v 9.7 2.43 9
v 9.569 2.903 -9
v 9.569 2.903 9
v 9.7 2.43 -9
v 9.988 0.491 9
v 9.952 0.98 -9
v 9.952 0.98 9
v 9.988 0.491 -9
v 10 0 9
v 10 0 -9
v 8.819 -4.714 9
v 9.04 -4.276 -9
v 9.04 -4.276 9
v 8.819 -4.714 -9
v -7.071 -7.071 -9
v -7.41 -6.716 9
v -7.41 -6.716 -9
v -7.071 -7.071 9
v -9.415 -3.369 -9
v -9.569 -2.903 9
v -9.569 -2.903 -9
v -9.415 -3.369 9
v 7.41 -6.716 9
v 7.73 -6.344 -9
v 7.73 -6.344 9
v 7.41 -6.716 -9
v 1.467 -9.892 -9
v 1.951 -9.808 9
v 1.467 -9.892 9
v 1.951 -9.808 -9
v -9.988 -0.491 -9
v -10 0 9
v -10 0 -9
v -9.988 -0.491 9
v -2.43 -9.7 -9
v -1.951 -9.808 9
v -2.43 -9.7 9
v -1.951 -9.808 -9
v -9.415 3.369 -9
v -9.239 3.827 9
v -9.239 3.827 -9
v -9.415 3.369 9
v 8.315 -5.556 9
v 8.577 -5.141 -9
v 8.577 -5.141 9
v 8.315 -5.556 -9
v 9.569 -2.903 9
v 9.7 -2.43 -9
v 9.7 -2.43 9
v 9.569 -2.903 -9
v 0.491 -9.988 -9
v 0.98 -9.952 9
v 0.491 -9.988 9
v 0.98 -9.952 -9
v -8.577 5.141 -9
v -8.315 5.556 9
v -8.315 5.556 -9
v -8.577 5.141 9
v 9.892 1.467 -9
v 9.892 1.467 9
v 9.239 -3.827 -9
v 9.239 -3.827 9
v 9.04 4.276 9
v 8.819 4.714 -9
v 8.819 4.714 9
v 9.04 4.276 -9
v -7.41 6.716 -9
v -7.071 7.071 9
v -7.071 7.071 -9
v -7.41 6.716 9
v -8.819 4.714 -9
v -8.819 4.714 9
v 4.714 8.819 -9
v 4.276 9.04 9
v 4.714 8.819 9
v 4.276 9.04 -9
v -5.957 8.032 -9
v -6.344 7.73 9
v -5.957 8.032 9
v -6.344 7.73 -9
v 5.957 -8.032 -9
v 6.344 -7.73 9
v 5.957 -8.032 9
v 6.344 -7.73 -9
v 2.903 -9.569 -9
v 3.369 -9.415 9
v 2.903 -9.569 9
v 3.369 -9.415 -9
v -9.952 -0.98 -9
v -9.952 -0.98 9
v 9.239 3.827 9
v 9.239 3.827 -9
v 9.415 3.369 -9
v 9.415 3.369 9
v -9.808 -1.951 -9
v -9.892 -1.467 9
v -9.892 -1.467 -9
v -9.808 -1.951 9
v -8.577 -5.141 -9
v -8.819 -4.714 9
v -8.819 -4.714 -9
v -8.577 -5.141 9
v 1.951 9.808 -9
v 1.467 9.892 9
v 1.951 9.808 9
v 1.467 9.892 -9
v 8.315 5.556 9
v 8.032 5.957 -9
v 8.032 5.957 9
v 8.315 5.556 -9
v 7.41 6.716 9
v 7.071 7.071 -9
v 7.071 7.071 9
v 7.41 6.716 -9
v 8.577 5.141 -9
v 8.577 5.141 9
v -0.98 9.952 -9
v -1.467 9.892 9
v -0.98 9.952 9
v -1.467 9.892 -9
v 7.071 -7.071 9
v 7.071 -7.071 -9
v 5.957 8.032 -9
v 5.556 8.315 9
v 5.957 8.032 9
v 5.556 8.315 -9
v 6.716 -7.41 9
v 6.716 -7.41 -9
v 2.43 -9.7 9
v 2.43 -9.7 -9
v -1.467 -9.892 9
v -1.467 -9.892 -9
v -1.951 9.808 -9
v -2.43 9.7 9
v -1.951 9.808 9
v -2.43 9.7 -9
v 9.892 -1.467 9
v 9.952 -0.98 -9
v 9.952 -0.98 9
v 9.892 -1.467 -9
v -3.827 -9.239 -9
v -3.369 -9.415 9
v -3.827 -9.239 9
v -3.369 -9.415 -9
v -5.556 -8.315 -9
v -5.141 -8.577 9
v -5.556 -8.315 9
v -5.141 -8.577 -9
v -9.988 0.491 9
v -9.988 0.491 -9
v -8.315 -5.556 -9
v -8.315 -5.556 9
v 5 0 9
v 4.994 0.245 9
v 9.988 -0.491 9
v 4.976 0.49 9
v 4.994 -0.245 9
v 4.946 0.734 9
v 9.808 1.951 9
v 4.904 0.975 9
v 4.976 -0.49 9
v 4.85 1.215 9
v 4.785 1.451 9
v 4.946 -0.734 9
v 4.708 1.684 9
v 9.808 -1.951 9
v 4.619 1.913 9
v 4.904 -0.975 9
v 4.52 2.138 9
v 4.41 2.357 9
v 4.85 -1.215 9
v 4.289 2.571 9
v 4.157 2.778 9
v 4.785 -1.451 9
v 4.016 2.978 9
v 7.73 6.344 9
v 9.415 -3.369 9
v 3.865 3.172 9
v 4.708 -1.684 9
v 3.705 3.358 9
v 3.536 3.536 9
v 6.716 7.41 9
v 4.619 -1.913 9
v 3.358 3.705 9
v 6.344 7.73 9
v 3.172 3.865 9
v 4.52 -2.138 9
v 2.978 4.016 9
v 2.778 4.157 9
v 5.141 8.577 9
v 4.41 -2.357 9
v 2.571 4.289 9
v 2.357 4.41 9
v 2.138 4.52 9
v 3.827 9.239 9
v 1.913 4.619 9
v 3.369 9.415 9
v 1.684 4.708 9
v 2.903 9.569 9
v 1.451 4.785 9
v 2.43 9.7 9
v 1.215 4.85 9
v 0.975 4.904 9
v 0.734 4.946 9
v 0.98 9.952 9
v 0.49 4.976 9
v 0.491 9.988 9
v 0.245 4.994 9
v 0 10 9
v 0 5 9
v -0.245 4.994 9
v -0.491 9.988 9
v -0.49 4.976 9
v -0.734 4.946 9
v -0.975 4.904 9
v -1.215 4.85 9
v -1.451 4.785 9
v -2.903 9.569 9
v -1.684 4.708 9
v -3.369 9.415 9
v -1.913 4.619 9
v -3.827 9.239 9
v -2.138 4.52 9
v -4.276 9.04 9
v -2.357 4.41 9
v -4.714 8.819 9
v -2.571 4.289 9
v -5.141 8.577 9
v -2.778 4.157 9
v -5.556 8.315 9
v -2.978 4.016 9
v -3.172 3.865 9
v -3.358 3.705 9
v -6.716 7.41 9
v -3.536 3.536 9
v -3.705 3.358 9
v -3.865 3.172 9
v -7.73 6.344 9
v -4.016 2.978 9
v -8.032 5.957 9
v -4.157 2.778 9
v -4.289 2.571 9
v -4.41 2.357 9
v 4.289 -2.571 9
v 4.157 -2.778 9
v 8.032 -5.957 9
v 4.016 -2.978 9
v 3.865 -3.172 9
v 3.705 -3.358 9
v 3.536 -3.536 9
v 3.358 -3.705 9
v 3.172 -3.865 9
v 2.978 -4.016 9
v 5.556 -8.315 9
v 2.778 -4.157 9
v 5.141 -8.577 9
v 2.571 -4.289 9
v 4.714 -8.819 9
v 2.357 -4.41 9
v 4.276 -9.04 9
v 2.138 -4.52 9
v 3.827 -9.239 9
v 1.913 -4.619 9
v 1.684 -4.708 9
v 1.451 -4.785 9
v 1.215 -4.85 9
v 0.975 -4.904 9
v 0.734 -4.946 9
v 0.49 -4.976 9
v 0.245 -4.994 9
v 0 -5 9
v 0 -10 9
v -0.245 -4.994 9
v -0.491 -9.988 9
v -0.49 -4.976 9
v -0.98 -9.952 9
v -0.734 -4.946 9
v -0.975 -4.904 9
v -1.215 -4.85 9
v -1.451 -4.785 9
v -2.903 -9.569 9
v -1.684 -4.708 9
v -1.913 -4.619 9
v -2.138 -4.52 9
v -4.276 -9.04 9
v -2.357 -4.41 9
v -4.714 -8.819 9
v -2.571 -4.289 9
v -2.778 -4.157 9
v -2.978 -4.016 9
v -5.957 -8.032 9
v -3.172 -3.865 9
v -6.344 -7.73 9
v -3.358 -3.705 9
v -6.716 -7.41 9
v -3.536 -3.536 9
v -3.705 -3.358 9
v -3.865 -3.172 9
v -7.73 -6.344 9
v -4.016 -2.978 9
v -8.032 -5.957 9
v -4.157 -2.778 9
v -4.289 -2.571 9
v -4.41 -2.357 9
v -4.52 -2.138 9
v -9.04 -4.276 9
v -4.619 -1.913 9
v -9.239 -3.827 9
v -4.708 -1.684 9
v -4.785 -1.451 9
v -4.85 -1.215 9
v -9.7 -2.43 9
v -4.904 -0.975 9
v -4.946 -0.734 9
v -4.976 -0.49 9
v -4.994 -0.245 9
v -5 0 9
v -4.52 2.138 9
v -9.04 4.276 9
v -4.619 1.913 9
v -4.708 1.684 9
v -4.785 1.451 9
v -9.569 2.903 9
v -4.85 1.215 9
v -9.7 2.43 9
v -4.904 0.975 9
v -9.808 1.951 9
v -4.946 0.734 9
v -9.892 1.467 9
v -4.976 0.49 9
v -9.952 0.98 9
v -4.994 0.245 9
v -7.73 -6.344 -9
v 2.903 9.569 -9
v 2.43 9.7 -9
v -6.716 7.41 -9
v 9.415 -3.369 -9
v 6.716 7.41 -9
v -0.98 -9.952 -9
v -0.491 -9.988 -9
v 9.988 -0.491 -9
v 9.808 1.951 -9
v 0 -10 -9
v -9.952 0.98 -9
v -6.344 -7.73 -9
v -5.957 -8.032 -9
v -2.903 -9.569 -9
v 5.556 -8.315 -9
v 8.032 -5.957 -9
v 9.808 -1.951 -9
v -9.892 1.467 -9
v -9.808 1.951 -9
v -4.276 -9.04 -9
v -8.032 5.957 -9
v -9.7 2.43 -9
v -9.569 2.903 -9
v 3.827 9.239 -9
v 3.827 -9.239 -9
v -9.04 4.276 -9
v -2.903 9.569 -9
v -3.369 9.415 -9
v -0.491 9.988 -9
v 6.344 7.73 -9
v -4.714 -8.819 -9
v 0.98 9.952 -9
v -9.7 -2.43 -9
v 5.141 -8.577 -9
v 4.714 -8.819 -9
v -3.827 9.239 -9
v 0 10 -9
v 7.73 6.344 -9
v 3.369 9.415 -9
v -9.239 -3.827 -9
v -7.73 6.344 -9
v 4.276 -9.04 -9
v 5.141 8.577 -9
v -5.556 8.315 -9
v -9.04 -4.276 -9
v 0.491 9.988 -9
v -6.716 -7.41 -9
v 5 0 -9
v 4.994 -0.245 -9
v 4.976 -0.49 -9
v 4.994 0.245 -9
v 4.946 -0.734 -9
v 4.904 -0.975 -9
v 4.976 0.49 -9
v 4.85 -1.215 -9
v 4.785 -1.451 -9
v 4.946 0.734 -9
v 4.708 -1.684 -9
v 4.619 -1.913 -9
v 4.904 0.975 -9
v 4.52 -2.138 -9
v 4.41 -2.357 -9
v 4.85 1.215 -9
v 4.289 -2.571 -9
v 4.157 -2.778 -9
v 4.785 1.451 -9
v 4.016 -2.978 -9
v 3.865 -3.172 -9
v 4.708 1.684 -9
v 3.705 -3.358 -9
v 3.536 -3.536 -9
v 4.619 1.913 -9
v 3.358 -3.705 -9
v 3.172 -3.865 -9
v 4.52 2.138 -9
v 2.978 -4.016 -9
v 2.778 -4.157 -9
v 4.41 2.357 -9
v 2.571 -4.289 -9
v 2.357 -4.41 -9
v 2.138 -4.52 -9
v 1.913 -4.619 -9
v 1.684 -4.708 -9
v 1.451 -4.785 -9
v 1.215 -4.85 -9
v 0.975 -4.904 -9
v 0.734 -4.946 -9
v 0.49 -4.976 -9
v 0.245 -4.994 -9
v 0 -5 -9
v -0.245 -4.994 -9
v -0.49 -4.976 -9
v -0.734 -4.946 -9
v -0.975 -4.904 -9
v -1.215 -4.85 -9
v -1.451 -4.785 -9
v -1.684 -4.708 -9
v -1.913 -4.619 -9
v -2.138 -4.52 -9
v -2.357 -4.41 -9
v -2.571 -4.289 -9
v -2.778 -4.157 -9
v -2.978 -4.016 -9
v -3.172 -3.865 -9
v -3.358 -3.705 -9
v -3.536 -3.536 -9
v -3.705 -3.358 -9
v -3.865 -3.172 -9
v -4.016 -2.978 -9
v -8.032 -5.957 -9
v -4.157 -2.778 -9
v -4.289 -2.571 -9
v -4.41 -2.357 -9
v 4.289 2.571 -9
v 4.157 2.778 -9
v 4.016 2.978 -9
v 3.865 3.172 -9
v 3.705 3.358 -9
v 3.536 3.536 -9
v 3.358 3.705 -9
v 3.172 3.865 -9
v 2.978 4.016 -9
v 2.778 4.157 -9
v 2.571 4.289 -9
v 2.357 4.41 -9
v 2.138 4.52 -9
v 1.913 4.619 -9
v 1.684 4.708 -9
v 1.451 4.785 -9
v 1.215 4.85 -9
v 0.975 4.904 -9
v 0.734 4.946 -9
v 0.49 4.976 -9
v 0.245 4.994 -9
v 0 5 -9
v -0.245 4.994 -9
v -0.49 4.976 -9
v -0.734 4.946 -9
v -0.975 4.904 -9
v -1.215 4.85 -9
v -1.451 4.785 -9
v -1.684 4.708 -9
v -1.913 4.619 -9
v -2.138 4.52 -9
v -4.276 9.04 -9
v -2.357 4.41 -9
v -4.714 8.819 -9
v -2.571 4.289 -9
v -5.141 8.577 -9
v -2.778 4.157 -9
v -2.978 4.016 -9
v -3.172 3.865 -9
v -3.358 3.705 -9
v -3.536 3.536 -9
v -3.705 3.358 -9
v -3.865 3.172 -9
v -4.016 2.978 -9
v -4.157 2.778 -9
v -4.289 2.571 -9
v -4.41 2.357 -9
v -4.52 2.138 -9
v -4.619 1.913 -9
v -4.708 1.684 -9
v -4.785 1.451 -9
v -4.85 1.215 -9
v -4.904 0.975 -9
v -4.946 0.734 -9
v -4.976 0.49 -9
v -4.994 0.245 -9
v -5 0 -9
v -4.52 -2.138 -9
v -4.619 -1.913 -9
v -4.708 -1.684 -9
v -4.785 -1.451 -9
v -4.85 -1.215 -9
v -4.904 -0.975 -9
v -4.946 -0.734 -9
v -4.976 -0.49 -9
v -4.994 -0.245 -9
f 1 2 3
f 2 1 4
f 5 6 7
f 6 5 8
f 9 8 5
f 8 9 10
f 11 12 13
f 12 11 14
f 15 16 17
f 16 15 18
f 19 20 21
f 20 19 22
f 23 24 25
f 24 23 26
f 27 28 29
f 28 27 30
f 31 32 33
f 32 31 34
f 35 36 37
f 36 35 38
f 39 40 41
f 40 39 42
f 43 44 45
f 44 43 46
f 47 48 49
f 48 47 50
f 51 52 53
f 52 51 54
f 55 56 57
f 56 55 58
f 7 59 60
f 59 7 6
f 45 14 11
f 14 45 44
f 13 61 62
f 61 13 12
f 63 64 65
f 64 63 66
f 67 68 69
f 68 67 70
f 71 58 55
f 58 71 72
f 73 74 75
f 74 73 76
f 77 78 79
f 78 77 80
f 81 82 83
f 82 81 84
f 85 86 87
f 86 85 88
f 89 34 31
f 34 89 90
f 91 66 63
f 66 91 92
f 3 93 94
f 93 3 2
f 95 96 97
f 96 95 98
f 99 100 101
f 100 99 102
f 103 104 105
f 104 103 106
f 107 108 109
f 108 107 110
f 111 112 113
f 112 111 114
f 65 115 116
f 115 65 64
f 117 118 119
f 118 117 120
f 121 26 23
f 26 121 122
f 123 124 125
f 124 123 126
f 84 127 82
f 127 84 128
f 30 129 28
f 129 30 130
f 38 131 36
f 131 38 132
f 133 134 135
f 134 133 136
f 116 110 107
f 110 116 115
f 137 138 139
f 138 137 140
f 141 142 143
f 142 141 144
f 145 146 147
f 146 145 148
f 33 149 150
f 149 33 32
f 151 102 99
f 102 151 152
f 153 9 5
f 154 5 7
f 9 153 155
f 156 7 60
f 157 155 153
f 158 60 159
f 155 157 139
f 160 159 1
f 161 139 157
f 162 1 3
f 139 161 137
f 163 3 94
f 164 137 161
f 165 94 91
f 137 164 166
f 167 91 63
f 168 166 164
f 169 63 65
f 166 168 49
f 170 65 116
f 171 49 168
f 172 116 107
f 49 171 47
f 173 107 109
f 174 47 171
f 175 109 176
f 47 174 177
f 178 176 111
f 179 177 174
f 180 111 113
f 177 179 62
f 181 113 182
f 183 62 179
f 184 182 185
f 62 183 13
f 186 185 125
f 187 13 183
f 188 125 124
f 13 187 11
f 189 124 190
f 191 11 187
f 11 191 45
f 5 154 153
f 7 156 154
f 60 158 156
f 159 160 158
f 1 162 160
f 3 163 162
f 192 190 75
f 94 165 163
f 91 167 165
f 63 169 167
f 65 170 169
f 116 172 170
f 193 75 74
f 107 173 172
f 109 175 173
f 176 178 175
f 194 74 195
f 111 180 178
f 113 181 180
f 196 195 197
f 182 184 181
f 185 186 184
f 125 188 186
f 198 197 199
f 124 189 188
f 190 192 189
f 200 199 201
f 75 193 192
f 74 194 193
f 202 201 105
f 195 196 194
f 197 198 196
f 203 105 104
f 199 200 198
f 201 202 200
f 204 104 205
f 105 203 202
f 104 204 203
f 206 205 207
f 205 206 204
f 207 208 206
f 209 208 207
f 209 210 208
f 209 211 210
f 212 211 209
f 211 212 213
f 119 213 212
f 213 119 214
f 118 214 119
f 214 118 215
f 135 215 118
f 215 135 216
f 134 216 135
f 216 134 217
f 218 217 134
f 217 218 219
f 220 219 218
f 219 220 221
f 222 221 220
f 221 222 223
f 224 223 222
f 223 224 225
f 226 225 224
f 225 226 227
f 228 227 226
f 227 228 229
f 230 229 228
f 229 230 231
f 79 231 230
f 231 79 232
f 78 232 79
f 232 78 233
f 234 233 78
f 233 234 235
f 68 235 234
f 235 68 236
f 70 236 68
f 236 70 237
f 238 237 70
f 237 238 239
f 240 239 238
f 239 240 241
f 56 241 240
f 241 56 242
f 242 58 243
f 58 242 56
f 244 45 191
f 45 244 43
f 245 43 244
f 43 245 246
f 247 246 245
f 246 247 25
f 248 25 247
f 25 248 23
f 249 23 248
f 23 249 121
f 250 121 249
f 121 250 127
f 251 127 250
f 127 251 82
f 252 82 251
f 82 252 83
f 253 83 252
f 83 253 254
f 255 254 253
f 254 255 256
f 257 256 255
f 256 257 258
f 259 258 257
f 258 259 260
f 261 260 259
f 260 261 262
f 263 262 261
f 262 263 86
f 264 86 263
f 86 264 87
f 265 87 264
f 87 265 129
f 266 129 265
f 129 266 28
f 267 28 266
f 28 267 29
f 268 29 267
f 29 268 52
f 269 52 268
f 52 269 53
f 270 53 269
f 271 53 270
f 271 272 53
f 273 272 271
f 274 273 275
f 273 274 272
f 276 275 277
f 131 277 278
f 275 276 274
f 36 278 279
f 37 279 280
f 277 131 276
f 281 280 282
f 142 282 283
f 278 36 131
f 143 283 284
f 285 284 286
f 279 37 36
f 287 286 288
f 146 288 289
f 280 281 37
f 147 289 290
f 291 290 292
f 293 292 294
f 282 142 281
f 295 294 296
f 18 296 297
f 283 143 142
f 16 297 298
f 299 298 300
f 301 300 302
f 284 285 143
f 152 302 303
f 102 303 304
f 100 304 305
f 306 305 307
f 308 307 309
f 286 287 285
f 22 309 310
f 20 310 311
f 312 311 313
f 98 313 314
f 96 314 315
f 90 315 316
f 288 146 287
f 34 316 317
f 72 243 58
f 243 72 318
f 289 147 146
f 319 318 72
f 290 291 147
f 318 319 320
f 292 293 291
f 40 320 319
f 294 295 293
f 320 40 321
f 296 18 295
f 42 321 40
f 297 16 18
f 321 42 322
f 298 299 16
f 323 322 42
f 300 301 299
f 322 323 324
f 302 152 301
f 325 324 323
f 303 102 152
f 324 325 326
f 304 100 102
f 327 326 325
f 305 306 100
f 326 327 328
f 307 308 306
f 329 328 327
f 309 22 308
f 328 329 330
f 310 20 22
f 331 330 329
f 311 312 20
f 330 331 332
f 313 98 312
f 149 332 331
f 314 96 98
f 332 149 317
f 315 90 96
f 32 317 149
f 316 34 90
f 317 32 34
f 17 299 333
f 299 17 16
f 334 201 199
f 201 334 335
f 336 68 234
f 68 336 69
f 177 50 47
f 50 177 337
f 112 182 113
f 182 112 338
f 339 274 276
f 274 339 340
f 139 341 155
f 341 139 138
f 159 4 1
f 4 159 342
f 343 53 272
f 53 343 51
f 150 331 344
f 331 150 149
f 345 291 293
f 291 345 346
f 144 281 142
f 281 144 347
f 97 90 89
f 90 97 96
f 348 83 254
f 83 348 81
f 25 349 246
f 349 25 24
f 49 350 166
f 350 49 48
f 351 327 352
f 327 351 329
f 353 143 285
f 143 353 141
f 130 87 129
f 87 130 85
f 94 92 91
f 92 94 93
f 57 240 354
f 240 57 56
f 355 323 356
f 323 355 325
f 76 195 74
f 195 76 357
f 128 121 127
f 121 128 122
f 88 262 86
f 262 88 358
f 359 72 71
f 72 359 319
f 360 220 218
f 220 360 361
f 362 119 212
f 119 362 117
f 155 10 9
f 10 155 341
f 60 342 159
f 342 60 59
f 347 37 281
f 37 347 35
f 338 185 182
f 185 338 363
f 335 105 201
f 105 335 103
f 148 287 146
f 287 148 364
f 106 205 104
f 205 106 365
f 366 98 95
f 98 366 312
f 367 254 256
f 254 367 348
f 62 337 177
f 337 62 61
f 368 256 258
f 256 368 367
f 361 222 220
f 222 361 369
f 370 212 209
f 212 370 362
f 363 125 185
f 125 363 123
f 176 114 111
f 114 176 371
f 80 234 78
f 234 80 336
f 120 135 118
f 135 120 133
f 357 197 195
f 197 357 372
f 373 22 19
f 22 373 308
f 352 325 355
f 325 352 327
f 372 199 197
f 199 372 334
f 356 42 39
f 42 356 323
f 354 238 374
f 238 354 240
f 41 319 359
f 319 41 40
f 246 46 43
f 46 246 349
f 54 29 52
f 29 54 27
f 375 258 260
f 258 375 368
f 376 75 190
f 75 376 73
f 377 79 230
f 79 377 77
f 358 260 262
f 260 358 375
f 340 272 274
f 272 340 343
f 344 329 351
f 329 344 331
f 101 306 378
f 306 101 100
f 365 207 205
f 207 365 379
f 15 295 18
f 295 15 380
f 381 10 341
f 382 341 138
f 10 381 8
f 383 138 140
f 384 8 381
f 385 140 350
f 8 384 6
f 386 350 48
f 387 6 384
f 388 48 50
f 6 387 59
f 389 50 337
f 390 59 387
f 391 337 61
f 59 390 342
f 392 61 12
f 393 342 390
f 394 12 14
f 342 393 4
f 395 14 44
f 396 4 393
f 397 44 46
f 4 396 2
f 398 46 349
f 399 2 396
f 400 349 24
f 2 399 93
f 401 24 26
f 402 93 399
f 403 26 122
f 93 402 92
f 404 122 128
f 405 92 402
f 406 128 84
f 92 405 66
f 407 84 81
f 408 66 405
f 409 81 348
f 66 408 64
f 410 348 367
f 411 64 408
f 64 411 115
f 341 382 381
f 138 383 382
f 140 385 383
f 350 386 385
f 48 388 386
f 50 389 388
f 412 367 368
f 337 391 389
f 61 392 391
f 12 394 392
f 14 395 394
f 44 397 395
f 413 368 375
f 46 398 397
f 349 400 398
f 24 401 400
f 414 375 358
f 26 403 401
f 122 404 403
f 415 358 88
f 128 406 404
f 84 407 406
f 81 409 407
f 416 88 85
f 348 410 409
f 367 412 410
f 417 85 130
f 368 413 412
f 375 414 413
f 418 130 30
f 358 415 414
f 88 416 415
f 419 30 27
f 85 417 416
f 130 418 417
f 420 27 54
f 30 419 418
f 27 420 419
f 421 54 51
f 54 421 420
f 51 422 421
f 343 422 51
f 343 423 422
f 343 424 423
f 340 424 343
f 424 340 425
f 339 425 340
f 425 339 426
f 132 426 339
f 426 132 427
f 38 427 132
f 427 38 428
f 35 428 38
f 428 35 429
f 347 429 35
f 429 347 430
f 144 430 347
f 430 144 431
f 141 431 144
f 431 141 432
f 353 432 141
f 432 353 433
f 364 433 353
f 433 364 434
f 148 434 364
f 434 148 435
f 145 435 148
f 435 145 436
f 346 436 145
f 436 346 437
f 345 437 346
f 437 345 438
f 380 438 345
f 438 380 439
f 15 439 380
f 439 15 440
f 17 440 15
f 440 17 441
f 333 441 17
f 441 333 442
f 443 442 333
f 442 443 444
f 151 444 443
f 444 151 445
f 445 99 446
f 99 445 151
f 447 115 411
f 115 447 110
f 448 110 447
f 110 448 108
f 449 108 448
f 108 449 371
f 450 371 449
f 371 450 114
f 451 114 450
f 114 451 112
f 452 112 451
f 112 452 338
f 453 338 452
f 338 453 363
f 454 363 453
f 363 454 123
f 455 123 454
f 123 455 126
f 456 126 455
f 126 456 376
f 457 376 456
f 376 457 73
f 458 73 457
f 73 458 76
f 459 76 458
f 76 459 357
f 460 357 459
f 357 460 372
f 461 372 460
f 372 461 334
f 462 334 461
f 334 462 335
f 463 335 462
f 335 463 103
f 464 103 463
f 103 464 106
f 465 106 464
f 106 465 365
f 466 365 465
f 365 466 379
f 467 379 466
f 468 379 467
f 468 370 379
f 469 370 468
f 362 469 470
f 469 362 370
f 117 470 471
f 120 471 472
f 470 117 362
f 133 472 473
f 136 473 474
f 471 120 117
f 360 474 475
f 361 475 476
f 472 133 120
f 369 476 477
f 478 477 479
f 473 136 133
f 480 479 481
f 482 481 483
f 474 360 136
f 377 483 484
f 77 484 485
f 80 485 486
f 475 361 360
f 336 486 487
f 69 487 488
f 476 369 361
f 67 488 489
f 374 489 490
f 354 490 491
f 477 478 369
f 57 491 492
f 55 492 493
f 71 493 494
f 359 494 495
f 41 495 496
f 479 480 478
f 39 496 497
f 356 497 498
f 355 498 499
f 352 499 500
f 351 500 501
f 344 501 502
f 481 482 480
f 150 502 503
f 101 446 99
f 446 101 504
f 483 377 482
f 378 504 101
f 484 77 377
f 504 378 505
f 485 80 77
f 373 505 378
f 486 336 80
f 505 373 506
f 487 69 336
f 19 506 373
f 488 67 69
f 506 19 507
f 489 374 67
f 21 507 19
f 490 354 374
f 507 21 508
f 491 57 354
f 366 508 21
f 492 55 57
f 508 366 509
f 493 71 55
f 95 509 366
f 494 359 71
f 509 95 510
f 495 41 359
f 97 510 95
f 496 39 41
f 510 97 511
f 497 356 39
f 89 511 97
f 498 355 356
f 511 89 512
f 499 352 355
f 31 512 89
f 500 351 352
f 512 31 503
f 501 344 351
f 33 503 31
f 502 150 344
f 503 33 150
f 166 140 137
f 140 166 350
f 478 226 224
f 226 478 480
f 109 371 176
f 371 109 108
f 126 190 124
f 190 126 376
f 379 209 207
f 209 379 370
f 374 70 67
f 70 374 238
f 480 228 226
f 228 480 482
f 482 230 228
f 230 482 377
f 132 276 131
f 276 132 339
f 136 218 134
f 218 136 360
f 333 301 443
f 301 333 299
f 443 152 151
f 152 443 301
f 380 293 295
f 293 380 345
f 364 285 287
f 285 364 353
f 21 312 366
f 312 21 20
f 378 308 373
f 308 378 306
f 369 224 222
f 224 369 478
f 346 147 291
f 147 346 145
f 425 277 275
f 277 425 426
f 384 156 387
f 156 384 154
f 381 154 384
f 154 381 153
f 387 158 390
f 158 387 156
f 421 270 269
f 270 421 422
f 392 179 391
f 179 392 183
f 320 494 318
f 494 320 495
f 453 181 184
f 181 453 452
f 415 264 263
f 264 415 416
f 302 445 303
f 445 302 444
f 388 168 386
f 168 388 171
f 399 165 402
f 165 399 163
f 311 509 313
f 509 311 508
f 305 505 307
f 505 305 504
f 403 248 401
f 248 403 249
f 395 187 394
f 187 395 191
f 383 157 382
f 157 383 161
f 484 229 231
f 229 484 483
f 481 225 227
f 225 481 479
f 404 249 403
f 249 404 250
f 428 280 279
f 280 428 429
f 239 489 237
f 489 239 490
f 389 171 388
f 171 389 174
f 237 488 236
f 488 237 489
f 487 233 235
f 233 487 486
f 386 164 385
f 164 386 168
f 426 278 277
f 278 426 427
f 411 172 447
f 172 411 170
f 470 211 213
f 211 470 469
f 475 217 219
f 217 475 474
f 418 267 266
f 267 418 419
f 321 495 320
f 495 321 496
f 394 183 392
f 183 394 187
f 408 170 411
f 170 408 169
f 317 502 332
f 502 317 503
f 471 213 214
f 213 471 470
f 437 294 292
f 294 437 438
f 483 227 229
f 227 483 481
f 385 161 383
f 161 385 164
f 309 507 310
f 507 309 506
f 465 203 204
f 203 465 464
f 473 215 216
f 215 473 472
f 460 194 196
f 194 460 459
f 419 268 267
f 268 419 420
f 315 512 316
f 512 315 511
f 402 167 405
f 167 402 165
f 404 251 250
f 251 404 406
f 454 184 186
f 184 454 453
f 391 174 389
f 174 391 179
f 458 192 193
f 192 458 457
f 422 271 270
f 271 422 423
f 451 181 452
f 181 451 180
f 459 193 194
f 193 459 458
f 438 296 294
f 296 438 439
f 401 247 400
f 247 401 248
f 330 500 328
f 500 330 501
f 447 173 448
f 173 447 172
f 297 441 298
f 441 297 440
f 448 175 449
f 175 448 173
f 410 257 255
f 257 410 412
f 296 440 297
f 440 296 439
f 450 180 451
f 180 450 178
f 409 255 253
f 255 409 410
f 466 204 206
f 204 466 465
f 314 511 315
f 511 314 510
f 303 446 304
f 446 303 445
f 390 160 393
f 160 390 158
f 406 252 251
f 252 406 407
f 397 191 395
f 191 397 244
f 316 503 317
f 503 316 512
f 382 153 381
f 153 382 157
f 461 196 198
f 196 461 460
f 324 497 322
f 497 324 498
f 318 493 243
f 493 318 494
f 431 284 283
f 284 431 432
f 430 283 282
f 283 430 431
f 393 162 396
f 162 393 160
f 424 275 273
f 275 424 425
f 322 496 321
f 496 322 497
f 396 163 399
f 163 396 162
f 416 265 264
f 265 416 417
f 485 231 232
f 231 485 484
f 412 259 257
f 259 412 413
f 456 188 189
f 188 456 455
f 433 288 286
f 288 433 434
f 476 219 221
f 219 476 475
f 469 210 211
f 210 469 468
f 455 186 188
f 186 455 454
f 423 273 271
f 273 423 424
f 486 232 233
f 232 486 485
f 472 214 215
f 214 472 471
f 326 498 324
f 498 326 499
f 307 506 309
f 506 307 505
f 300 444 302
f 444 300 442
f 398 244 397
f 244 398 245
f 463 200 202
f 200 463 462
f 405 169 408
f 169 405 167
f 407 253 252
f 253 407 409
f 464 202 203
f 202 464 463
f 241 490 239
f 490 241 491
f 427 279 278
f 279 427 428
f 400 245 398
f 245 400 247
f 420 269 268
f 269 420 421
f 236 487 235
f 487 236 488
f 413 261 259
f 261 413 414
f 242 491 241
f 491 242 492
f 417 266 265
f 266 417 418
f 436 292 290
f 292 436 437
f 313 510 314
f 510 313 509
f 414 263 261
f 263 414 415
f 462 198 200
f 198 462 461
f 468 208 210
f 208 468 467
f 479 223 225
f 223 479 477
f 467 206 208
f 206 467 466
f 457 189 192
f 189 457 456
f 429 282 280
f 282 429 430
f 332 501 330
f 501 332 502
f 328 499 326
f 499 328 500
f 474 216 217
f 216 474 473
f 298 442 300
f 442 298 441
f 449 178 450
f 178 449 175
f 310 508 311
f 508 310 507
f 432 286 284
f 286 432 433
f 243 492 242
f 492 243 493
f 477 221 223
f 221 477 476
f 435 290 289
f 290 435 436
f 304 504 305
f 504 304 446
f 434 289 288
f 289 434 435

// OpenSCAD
// Simple washer/spacer: solid cylindrical disk with a central through-hole
// Bounding box: 20 x 20 x 18 mm

$fn = 128;

// Parameters
outer_diameter = 20;      // mm
thickness      = 18;      // mm
hole_diameter  = 10;      // mm
overlap        = 0.5;     // mm (ensures clean through-cut)

module spacer() {
    difference() {
        cylinder(d=outer_diameter, h=thickness, center=true);
        cylinder(d=hole_diameter,  h=thickness + 2*overlap, center=true);
    }
}

spacer();
